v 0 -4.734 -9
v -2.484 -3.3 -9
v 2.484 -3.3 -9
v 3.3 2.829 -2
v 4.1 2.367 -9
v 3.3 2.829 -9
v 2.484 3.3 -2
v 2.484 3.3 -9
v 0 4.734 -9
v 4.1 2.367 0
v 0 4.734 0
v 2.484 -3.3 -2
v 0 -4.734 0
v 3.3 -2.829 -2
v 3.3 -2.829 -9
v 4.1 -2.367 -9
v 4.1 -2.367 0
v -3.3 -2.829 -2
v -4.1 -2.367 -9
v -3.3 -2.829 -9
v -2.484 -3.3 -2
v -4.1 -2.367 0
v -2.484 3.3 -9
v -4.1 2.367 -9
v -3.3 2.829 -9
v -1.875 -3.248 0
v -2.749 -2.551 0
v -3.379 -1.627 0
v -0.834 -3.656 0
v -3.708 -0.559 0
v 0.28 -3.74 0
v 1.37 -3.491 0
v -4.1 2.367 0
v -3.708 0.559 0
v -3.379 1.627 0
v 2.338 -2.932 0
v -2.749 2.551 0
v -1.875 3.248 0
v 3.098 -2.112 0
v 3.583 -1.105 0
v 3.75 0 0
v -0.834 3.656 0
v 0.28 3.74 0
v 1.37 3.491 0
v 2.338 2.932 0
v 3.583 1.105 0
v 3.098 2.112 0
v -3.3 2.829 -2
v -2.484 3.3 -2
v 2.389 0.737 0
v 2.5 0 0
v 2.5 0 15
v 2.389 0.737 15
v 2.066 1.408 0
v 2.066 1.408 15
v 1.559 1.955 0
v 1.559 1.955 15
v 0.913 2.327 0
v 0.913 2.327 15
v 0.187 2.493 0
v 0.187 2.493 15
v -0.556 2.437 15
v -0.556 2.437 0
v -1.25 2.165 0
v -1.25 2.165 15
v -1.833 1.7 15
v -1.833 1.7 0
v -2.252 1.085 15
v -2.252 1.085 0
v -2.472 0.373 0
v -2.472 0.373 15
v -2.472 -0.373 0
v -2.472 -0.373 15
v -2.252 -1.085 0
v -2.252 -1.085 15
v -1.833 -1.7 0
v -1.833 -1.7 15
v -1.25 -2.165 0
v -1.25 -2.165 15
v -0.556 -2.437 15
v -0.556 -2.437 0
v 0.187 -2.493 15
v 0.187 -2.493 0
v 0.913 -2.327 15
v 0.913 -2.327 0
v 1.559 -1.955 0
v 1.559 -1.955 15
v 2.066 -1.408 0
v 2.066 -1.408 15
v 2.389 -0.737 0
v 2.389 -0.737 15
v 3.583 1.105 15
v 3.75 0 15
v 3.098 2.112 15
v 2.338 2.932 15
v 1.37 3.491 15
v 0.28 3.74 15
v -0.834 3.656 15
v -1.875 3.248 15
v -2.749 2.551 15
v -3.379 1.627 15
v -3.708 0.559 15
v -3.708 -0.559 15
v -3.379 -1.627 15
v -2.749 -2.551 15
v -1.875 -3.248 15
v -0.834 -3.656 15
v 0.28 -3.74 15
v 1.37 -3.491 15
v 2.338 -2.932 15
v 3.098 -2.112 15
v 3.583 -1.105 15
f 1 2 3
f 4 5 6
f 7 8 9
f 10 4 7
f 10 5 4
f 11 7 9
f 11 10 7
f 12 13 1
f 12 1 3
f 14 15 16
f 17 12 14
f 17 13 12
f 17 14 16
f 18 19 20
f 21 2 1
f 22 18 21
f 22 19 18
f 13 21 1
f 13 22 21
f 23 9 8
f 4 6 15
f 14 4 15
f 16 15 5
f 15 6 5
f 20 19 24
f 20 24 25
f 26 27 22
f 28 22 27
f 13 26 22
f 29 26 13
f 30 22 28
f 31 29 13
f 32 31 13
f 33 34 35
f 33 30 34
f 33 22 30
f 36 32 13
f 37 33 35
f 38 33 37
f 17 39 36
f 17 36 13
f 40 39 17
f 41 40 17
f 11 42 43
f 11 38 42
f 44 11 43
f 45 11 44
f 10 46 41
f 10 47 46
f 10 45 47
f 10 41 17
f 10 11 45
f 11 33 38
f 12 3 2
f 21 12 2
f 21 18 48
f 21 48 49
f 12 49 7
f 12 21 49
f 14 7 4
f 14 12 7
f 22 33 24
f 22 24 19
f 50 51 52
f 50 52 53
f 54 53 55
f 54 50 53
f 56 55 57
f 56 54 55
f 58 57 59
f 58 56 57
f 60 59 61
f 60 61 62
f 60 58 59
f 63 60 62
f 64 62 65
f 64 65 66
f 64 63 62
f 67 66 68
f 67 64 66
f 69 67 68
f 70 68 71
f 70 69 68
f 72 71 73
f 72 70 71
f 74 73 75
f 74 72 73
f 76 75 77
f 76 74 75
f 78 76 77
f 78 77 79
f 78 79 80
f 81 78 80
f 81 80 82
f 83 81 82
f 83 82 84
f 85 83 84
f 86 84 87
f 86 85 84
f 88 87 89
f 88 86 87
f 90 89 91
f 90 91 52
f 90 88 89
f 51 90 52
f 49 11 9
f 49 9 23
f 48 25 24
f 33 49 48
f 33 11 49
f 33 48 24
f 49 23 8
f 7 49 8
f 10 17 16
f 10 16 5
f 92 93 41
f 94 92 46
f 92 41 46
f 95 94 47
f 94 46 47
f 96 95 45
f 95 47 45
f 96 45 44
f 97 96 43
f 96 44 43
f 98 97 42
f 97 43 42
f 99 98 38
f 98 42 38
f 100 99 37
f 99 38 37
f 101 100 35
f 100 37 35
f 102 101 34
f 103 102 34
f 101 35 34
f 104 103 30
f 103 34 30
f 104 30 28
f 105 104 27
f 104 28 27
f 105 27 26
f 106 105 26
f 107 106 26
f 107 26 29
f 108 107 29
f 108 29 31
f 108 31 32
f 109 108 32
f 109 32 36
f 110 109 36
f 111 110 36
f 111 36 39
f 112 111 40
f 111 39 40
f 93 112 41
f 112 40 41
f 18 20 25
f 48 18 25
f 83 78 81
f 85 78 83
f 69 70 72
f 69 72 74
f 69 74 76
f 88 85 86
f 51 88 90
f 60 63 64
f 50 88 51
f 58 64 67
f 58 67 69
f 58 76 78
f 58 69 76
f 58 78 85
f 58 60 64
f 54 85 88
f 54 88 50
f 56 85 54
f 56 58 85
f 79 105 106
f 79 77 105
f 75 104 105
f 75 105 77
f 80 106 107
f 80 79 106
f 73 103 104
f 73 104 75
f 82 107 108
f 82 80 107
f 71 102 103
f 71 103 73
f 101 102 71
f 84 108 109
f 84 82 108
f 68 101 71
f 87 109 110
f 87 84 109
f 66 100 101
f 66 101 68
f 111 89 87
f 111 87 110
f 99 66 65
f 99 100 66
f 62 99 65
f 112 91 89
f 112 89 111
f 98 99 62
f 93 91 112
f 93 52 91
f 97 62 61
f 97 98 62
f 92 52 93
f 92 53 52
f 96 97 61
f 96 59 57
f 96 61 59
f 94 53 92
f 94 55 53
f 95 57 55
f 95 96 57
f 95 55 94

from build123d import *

# Parameters (mm, degrees)
F0_R     = 3.75
F0_R_2   = 2.5
F1_DEPTH = 15
F2_DEPTH = 9
F4_DEPTH = 7


# Not quite as in the source:
# - a feature names something its author has since deleted; it is built from what else it names


with BuildPart() as f1:
    # F0 (on Top) → F1 (new body)
    with BuildSketch(Plane.XY):
        Circle(F0_R)
        Circle(F0_R_2, mode=Mode.SUBTRACT)
    extrude(amount=F1_DEPTH)

    # F0 (on Top) → F2 (join)
    with BuildSketch(Plane.XY):
        Polygon((4.1, -2.3671361037), (4.1, 2.3671361037), (0, 4.7342722074), (-4.1, 2.3671361037), (-4.1, -2.3671361037), (0, -4.7342722074), align=None)
        Circle(F0_R, mode=Mode.SUBTRACT)
        Circle(F0_R)
        Circle(F0_R_2, mode=Mode.SUBTRACT)
        Circle(F0_R_2)
    extrude(amount=-F2_DEPTH)

    # F3 (on face) → F4 (cut)
    with BuildSketch(Plane(origin=(0, 0, -9), x_dir=(1, 0, 0), z_dir=(0, 0, -1))):
        Polygon((-3.3, 2.829016319), (-3.3, 0), (-3.3, -2.829016319), (-2.484232335, -3.3), (0, -3.3), (2.484232335, -3.3), (3.3, -2.829016319), (3.3, 0), (3.3, 2.829016319), (2.484232335, 3.3), (0, 3.3), (-2.484232335, 3.3), align=None)
    extrude(amount=-F4_DEPTH, mode=Mode.SUBTRACT)


solid = f1.part
